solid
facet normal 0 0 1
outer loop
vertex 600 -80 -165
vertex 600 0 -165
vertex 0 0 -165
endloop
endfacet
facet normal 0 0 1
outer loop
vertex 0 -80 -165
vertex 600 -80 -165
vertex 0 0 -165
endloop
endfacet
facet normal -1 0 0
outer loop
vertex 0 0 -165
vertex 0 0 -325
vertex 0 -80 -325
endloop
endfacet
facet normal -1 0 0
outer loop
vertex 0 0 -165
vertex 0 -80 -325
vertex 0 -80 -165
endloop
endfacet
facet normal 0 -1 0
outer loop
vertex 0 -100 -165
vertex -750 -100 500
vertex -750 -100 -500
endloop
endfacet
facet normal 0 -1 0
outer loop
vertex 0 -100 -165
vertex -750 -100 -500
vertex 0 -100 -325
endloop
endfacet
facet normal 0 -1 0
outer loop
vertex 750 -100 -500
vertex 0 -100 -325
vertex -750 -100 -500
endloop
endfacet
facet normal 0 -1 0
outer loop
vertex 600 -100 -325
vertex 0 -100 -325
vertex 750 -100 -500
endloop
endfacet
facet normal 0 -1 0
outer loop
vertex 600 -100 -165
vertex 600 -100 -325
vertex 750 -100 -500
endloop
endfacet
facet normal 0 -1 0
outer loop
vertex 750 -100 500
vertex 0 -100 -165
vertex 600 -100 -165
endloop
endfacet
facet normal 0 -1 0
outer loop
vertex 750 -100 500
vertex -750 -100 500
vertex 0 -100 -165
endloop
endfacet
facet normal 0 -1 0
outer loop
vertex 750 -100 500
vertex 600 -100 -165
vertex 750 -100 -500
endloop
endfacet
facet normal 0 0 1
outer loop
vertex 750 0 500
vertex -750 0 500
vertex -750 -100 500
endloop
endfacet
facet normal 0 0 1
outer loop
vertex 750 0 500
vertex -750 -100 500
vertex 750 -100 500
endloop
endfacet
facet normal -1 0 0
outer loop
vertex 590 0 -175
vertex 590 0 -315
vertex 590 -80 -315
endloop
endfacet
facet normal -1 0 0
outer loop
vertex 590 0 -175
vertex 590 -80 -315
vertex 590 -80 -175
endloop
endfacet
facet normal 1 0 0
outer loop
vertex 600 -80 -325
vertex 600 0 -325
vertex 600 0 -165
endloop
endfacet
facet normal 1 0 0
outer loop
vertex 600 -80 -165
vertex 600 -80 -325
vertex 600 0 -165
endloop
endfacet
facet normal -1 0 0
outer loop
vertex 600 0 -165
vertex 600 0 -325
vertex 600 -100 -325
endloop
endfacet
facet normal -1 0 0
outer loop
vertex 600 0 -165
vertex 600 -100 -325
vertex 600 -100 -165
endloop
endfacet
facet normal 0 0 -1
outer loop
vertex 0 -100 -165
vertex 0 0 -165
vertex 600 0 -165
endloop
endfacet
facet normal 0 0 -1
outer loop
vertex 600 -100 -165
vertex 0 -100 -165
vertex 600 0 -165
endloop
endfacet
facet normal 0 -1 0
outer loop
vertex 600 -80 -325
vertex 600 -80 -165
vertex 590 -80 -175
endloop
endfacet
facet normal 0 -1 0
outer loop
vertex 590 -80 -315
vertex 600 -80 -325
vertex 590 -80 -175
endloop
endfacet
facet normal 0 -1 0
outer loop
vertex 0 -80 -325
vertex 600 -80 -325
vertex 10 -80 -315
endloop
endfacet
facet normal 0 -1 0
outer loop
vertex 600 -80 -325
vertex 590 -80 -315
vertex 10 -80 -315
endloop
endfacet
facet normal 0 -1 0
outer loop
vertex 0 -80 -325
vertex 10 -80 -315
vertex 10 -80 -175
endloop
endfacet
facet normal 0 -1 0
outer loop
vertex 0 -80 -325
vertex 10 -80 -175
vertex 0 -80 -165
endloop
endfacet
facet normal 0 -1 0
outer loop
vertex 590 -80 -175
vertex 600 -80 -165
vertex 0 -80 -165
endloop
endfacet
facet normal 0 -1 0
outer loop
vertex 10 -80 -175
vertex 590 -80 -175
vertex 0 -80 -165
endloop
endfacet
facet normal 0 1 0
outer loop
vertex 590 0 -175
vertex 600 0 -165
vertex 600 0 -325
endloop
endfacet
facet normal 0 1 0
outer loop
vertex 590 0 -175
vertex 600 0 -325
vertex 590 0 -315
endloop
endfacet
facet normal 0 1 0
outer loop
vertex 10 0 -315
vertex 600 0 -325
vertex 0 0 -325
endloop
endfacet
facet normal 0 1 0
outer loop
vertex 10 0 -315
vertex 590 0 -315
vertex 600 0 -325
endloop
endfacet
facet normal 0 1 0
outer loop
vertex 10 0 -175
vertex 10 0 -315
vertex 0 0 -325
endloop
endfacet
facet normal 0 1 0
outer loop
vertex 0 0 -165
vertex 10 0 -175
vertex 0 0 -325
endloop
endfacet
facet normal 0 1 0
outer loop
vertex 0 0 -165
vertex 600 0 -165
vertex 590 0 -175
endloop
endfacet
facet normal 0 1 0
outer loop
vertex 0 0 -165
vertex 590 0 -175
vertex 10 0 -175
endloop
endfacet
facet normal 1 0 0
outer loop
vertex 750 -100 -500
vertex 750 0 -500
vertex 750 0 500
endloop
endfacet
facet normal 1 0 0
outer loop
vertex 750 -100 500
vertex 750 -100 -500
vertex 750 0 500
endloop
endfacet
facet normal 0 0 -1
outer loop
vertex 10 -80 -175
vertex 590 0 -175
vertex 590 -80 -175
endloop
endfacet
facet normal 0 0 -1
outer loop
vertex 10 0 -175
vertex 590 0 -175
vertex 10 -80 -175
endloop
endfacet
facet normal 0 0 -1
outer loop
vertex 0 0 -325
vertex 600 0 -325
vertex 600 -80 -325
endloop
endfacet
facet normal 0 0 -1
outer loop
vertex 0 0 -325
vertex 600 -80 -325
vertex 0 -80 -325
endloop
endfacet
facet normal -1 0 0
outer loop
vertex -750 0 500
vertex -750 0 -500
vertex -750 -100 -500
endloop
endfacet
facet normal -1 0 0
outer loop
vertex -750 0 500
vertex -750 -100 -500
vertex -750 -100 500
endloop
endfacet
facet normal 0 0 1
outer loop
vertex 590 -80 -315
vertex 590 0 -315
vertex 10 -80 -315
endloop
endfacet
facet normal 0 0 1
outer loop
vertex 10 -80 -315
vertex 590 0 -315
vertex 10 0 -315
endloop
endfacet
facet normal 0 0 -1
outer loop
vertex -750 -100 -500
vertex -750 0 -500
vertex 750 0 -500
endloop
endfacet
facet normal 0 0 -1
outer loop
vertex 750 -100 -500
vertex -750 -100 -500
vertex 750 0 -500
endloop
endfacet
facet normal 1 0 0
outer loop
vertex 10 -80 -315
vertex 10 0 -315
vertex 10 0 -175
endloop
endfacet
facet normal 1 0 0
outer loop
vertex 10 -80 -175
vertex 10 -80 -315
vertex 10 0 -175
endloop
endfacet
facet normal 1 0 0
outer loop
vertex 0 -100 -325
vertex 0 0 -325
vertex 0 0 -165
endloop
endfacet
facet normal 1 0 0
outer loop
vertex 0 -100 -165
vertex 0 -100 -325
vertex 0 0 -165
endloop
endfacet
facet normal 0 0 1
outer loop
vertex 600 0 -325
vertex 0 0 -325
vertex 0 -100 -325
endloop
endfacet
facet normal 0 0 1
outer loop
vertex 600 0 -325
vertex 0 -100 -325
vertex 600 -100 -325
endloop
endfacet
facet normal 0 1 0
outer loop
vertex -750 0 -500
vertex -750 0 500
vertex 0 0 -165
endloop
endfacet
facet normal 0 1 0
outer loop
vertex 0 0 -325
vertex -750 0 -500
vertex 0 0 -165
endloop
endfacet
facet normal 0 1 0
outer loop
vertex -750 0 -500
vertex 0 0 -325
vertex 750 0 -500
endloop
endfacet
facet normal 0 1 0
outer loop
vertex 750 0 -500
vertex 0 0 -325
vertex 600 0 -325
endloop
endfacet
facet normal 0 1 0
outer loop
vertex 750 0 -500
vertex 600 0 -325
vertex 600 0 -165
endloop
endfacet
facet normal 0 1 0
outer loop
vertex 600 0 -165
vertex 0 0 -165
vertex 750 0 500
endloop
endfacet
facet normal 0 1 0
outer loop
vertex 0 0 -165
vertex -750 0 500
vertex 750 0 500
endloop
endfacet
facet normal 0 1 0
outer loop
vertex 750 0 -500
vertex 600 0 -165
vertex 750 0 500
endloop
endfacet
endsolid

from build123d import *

# Parameters (mm, degrees)
F0_W     = 1500
F0_H     = 1000
F0_W_2   = 600
F0_H_2   = 160
F1_DEPTH = 100
F2_W     = 600
F2_H     = 160
F2_W_2   = 580
F2_H_2   = 140
F3_DEPTH = 80


with BuildPart() as f1:
    # F0 (on Front) → F1 (new body)
    with BuildSketch(Plane.XZ):
        Rectangle(F0_W, F0_H)
        with Locations((300, -244.999988)):
            Rectangle(F0_W_2, F0_H_2, mode=Mode.SUBTRACT)
    extrude(amount=F1_DEPTH)


with BuildPart() as f3:
    # F2 (on face) → F3 (new body)
    with BuildSketch(Plane(origin=(0, 0, 0), x_dir=(-1, 0, 0), z_dir=(0, 1, 0))):
        with Locations((-300, -244.999988)):
            Rectangle(F2_W, F2_H)
        with Locations((-300, -244.999988)):
            Rectangle(F2_W_2, F2_H_2, mode=Mode.SUBTRACT)
    extrude(amount=-F3_DEPTH)


solid = Compound([f1.part, f3.part])
